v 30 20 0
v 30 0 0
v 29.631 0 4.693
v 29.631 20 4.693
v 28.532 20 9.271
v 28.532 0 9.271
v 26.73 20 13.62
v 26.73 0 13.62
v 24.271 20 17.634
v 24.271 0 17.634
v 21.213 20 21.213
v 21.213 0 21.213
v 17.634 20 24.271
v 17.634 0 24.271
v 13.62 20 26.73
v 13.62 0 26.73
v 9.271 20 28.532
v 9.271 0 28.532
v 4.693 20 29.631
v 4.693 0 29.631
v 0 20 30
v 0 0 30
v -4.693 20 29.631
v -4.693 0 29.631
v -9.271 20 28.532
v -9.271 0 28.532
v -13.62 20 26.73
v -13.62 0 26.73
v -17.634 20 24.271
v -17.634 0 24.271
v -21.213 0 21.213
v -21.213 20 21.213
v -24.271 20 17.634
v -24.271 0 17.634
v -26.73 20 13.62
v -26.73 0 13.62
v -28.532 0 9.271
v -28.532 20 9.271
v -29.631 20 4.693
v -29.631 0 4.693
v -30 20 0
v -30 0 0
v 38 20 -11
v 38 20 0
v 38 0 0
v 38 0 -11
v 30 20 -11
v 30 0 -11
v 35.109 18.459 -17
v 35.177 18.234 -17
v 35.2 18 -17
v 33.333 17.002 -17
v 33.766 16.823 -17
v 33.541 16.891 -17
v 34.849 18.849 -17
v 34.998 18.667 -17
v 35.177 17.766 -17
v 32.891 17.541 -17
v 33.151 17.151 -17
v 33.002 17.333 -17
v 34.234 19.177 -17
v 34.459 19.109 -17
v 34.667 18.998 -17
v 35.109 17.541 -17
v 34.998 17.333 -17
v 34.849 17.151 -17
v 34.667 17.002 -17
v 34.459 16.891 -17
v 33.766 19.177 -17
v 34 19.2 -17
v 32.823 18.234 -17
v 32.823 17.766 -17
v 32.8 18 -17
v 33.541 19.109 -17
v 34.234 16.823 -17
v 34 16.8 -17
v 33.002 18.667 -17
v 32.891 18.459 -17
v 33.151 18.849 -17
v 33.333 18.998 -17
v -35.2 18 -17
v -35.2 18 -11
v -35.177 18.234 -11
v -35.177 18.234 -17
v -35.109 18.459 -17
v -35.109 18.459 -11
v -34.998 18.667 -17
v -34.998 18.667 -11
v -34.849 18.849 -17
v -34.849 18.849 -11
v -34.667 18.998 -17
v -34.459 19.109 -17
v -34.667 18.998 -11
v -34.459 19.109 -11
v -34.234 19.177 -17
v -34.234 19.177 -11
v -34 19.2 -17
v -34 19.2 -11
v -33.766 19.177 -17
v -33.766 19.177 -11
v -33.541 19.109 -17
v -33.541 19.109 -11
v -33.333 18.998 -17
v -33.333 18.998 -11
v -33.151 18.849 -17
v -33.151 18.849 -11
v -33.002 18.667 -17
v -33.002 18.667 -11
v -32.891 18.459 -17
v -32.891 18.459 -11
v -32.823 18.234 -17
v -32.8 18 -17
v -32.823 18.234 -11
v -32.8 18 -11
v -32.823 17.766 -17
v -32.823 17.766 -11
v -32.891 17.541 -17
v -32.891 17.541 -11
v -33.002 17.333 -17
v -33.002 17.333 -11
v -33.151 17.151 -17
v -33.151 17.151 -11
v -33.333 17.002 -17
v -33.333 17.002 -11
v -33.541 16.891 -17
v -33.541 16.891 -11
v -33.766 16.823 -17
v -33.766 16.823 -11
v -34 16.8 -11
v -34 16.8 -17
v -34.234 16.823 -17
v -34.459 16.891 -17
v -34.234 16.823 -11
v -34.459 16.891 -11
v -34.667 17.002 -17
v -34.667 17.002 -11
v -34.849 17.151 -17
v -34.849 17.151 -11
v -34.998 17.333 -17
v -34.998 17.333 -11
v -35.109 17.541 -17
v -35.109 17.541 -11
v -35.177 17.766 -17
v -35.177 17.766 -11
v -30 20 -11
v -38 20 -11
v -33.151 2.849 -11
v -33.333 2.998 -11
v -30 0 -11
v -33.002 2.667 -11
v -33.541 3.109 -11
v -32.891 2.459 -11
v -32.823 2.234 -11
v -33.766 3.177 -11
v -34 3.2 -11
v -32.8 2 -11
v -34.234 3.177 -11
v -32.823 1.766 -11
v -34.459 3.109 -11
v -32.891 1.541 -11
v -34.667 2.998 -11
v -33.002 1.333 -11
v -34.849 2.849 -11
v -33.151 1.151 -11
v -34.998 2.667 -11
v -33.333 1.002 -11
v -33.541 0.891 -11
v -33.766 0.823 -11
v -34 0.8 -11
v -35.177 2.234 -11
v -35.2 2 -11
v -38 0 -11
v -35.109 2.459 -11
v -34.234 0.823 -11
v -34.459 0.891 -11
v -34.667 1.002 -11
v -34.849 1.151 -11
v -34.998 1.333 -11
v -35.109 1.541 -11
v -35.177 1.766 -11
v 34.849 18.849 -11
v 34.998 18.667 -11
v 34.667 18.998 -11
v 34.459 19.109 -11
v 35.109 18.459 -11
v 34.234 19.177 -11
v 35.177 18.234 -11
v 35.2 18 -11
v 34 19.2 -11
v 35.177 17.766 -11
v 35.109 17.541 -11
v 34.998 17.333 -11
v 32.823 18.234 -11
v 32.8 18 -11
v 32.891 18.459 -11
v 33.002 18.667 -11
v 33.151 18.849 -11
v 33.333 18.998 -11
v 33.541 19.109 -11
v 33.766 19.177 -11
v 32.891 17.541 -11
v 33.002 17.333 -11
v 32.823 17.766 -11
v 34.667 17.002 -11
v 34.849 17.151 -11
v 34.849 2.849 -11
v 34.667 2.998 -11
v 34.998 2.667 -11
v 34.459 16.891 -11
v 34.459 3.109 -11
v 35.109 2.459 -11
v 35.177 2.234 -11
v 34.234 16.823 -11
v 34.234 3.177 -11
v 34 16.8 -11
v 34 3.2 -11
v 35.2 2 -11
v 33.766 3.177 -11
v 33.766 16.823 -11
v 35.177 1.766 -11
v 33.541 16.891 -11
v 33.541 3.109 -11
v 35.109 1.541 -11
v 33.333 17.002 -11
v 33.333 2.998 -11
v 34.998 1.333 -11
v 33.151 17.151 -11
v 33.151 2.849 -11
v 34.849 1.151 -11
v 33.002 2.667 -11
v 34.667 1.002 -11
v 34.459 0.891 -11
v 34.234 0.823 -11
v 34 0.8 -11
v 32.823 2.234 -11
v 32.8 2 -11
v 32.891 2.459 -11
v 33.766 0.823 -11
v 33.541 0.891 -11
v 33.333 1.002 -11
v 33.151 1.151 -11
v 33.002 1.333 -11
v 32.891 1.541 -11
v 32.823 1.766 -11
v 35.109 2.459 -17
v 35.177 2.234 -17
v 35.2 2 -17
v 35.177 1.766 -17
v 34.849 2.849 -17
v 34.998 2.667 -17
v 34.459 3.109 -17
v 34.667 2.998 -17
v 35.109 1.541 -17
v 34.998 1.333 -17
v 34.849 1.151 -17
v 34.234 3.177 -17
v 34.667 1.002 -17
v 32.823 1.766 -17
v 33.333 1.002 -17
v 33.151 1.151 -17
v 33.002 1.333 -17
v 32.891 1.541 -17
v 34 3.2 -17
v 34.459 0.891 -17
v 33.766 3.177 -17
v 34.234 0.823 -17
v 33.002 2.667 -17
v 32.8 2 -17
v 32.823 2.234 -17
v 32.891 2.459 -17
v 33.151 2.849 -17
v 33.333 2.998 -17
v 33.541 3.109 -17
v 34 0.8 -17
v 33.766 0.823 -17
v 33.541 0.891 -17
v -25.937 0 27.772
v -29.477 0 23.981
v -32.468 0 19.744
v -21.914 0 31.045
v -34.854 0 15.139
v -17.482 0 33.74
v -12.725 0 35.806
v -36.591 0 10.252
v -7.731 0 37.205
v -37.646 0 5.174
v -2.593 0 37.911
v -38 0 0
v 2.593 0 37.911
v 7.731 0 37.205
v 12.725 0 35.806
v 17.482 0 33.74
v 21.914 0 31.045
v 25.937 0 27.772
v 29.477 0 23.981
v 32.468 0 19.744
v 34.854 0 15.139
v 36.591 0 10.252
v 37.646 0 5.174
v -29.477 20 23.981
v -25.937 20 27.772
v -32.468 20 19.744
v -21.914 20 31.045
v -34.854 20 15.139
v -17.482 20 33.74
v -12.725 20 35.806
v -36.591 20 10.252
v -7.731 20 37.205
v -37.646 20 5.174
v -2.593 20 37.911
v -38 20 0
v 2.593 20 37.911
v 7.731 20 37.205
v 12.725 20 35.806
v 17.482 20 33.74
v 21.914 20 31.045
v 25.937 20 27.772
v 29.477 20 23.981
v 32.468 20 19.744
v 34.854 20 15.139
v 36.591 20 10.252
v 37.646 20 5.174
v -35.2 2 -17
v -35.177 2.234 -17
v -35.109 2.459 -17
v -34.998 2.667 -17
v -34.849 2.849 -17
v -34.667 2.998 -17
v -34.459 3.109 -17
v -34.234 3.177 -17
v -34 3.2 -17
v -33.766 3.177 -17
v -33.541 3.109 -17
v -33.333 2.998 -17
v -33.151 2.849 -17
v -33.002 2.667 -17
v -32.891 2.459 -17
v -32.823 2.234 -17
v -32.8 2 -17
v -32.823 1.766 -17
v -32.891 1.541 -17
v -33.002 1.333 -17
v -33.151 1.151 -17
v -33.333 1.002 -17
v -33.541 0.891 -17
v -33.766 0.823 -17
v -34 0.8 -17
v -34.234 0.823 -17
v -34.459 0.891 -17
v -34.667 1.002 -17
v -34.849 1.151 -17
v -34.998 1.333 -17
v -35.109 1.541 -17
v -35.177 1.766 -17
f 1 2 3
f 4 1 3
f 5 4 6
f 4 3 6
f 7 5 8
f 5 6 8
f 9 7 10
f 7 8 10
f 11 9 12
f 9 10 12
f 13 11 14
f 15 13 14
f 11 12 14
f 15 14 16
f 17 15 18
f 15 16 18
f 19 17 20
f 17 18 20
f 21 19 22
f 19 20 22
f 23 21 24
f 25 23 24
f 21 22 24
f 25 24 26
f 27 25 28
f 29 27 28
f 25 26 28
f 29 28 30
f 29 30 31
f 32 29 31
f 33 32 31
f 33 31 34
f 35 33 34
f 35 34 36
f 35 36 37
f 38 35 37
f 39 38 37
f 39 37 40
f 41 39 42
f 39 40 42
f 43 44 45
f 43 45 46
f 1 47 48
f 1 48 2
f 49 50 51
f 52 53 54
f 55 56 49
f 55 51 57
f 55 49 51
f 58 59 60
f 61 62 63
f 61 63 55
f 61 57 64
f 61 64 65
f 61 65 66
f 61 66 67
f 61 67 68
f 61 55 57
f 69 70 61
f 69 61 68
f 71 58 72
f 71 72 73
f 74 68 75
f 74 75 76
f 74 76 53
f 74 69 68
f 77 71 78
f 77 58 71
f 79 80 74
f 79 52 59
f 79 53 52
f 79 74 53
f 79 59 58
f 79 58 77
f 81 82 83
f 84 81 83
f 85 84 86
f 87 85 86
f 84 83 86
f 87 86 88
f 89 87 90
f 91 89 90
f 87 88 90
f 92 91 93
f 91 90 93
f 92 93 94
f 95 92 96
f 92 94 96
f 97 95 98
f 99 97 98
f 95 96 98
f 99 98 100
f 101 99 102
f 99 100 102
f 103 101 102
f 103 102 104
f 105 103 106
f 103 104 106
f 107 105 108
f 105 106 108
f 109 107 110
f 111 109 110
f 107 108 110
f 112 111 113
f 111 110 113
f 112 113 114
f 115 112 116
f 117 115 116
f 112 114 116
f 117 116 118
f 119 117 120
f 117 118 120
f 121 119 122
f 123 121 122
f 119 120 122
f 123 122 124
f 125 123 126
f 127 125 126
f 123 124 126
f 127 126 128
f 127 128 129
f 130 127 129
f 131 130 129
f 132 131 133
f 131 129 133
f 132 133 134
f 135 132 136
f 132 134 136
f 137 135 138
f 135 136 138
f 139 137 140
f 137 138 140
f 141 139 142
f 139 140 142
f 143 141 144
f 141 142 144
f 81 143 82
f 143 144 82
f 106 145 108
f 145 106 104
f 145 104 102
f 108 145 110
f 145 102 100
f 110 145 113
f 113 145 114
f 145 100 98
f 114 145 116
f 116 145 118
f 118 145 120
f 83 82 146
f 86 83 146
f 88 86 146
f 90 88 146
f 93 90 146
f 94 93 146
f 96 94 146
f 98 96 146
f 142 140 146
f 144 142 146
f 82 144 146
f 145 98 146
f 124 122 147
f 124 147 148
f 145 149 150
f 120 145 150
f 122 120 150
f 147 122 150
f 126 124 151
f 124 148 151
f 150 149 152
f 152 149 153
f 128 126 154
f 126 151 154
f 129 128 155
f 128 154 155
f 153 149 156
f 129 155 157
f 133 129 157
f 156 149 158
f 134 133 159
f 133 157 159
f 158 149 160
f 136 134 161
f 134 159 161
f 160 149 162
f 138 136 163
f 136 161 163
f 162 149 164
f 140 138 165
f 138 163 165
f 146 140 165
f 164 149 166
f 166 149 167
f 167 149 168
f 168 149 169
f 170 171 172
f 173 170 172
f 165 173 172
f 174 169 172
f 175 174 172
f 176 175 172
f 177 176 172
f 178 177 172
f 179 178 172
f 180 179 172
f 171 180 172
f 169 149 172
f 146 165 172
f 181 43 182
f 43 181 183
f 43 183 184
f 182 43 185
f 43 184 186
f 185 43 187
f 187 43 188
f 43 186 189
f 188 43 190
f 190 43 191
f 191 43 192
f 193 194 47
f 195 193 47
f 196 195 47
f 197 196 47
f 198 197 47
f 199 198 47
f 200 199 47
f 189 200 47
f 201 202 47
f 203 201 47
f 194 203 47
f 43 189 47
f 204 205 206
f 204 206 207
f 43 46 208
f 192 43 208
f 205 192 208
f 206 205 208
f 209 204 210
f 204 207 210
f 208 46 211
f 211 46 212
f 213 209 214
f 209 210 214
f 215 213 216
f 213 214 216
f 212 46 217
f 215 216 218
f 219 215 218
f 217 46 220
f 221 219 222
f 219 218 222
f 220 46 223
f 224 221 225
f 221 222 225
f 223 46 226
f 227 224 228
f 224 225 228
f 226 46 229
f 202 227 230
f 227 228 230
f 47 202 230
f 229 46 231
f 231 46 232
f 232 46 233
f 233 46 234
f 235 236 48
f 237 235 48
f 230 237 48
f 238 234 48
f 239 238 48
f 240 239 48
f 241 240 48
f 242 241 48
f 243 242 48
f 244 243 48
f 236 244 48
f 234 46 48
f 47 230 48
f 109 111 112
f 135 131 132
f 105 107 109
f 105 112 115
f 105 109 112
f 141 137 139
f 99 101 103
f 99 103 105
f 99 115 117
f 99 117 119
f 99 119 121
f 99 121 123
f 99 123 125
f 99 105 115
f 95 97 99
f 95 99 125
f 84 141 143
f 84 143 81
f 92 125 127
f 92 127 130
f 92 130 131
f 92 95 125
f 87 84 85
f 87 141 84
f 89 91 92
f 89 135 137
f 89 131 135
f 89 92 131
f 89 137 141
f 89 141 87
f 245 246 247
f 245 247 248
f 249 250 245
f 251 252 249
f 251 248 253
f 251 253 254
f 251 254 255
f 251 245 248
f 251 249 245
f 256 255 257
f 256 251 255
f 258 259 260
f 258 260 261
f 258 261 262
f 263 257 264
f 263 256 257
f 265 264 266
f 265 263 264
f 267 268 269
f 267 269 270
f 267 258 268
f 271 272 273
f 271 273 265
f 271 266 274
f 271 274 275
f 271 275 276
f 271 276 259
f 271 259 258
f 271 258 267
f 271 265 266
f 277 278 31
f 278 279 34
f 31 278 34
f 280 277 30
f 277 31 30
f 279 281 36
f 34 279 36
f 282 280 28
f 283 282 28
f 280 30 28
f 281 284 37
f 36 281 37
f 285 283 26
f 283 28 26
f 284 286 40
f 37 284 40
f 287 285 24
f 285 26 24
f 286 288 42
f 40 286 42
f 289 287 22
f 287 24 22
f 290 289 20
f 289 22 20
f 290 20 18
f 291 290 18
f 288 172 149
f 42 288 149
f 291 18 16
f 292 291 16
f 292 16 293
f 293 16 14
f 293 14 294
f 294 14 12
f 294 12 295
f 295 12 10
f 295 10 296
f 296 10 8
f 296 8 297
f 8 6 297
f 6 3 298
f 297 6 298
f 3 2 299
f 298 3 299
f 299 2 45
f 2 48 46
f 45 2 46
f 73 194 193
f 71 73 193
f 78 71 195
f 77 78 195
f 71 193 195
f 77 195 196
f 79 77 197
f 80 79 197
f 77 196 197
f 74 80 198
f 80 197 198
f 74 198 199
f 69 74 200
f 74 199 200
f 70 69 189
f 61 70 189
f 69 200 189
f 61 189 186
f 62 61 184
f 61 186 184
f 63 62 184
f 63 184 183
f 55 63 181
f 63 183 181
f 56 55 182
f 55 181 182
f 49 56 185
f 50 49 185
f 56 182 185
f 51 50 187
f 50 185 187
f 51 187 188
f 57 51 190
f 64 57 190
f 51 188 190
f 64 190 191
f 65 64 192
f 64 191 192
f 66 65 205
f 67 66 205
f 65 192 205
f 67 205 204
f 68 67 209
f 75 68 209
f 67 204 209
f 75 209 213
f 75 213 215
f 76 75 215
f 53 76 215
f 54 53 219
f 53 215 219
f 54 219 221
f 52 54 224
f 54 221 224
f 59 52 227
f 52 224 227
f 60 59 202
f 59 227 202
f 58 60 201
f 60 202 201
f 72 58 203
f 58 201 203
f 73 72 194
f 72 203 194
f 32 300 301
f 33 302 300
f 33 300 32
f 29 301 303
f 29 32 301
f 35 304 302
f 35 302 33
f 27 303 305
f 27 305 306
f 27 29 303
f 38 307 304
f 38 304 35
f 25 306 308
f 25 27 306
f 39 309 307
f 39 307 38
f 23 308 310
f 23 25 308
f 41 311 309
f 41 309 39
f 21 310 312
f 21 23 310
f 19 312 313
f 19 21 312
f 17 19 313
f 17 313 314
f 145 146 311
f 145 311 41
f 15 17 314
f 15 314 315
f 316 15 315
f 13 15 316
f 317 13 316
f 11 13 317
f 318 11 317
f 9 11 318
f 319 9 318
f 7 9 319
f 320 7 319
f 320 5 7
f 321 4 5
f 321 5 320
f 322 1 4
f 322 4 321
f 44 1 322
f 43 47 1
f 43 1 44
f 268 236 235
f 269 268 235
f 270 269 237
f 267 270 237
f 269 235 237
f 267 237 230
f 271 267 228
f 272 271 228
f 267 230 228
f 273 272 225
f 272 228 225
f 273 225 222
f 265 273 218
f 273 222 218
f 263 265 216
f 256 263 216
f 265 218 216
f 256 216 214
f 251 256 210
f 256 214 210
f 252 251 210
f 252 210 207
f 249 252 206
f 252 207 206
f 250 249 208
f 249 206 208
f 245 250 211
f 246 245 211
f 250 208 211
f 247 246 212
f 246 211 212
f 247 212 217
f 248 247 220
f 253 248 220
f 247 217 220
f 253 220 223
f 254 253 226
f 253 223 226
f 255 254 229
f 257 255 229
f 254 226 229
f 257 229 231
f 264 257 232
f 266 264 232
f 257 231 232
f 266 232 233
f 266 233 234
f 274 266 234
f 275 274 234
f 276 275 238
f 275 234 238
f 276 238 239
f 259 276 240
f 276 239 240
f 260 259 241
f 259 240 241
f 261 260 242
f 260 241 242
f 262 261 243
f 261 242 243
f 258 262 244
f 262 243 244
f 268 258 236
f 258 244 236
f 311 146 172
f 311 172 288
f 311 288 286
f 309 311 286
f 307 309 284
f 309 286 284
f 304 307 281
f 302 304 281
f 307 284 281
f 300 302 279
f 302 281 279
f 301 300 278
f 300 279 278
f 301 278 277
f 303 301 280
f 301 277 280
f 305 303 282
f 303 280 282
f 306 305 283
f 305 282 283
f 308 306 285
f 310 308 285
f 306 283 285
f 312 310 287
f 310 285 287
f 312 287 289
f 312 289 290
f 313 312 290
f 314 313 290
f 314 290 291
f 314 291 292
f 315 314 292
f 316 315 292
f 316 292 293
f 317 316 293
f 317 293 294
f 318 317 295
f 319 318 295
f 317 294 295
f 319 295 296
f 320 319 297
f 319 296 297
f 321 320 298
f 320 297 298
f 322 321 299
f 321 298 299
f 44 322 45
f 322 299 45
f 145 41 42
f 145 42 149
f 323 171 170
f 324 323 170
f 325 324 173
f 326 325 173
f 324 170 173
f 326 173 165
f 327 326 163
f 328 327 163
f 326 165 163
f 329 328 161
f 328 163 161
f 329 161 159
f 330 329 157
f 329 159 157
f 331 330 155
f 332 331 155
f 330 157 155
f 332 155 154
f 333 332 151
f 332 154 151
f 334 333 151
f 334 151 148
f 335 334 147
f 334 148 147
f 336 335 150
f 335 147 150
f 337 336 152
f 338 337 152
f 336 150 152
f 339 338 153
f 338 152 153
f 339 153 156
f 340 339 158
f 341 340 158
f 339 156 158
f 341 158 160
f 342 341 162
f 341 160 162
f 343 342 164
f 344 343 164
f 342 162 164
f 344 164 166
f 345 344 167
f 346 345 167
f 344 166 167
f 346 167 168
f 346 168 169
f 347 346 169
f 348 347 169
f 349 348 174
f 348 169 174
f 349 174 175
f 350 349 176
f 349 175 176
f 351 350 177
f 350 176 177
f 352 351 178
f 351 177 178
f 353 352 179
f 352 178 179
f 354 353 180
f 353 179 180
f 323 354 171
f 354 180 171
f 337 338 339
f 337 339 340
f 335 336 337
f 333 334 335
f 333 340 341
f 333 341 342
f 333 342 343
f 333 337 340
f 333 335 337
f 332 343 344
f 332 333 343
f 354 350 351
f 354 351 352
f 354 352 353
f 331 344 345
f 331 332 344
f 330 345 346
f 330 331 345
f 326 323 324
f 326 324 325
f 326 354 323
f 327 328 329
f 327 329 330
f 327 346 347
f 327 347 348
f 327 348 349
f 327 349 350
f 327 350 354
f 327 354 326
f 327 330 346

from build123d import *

# Parameters (mm, degrees)
EXTRUDE_1_DEPTH = 20
SKETCH_3_R      = 1.2
EXTRUDE_2_DEPTH = 6


with BuildPart() as part:
    # 草图2 → 凸台-拉伸1 (new body)
    with BuildSketch(Plane(origin=(0, 0, 0), x_dir=(1, 0, 0), z_dir=(0, 1, 0))):
        with BuildLine():
            Line((-30, 0), (-30, 11))
            Line((-30, 11), (-38, 11))
            Line((-38, 11), (-38, 0))
            ThreePointArc((-38, 0), (0, -38), (38, 0))
            Line((38, 0), (38, 11))
            Line((38, 11), (30, 11))
            Line((30, 11), (30, 0))
            ThreePointArc((30, 0), (0, -30), (-30, 0))
        make_face()
    extrude(amount=EXTRUDE_1_DEPTH)

    # 草图3 → 凸台-拉伸2 (add)
    with BuildSketch(Plane(origin=(0, 0, -11), x_dir=(-1, 0, 0), z_dir=(0, 0, -1))):
        with Locations((-34, 18)):
            Circle(SKETCH_3_R)
        with Locations((-34, 2)):
            Circle(SKETCH_3_R)
        with Locations((34, 18)):
            Circle(SKETCH_3_R)
        with Locations((34, 2)):
            Circle(SKETCH_3_R)
    extrude(amount=EXTRUDE_2_DEPTH)


solid = part.part
